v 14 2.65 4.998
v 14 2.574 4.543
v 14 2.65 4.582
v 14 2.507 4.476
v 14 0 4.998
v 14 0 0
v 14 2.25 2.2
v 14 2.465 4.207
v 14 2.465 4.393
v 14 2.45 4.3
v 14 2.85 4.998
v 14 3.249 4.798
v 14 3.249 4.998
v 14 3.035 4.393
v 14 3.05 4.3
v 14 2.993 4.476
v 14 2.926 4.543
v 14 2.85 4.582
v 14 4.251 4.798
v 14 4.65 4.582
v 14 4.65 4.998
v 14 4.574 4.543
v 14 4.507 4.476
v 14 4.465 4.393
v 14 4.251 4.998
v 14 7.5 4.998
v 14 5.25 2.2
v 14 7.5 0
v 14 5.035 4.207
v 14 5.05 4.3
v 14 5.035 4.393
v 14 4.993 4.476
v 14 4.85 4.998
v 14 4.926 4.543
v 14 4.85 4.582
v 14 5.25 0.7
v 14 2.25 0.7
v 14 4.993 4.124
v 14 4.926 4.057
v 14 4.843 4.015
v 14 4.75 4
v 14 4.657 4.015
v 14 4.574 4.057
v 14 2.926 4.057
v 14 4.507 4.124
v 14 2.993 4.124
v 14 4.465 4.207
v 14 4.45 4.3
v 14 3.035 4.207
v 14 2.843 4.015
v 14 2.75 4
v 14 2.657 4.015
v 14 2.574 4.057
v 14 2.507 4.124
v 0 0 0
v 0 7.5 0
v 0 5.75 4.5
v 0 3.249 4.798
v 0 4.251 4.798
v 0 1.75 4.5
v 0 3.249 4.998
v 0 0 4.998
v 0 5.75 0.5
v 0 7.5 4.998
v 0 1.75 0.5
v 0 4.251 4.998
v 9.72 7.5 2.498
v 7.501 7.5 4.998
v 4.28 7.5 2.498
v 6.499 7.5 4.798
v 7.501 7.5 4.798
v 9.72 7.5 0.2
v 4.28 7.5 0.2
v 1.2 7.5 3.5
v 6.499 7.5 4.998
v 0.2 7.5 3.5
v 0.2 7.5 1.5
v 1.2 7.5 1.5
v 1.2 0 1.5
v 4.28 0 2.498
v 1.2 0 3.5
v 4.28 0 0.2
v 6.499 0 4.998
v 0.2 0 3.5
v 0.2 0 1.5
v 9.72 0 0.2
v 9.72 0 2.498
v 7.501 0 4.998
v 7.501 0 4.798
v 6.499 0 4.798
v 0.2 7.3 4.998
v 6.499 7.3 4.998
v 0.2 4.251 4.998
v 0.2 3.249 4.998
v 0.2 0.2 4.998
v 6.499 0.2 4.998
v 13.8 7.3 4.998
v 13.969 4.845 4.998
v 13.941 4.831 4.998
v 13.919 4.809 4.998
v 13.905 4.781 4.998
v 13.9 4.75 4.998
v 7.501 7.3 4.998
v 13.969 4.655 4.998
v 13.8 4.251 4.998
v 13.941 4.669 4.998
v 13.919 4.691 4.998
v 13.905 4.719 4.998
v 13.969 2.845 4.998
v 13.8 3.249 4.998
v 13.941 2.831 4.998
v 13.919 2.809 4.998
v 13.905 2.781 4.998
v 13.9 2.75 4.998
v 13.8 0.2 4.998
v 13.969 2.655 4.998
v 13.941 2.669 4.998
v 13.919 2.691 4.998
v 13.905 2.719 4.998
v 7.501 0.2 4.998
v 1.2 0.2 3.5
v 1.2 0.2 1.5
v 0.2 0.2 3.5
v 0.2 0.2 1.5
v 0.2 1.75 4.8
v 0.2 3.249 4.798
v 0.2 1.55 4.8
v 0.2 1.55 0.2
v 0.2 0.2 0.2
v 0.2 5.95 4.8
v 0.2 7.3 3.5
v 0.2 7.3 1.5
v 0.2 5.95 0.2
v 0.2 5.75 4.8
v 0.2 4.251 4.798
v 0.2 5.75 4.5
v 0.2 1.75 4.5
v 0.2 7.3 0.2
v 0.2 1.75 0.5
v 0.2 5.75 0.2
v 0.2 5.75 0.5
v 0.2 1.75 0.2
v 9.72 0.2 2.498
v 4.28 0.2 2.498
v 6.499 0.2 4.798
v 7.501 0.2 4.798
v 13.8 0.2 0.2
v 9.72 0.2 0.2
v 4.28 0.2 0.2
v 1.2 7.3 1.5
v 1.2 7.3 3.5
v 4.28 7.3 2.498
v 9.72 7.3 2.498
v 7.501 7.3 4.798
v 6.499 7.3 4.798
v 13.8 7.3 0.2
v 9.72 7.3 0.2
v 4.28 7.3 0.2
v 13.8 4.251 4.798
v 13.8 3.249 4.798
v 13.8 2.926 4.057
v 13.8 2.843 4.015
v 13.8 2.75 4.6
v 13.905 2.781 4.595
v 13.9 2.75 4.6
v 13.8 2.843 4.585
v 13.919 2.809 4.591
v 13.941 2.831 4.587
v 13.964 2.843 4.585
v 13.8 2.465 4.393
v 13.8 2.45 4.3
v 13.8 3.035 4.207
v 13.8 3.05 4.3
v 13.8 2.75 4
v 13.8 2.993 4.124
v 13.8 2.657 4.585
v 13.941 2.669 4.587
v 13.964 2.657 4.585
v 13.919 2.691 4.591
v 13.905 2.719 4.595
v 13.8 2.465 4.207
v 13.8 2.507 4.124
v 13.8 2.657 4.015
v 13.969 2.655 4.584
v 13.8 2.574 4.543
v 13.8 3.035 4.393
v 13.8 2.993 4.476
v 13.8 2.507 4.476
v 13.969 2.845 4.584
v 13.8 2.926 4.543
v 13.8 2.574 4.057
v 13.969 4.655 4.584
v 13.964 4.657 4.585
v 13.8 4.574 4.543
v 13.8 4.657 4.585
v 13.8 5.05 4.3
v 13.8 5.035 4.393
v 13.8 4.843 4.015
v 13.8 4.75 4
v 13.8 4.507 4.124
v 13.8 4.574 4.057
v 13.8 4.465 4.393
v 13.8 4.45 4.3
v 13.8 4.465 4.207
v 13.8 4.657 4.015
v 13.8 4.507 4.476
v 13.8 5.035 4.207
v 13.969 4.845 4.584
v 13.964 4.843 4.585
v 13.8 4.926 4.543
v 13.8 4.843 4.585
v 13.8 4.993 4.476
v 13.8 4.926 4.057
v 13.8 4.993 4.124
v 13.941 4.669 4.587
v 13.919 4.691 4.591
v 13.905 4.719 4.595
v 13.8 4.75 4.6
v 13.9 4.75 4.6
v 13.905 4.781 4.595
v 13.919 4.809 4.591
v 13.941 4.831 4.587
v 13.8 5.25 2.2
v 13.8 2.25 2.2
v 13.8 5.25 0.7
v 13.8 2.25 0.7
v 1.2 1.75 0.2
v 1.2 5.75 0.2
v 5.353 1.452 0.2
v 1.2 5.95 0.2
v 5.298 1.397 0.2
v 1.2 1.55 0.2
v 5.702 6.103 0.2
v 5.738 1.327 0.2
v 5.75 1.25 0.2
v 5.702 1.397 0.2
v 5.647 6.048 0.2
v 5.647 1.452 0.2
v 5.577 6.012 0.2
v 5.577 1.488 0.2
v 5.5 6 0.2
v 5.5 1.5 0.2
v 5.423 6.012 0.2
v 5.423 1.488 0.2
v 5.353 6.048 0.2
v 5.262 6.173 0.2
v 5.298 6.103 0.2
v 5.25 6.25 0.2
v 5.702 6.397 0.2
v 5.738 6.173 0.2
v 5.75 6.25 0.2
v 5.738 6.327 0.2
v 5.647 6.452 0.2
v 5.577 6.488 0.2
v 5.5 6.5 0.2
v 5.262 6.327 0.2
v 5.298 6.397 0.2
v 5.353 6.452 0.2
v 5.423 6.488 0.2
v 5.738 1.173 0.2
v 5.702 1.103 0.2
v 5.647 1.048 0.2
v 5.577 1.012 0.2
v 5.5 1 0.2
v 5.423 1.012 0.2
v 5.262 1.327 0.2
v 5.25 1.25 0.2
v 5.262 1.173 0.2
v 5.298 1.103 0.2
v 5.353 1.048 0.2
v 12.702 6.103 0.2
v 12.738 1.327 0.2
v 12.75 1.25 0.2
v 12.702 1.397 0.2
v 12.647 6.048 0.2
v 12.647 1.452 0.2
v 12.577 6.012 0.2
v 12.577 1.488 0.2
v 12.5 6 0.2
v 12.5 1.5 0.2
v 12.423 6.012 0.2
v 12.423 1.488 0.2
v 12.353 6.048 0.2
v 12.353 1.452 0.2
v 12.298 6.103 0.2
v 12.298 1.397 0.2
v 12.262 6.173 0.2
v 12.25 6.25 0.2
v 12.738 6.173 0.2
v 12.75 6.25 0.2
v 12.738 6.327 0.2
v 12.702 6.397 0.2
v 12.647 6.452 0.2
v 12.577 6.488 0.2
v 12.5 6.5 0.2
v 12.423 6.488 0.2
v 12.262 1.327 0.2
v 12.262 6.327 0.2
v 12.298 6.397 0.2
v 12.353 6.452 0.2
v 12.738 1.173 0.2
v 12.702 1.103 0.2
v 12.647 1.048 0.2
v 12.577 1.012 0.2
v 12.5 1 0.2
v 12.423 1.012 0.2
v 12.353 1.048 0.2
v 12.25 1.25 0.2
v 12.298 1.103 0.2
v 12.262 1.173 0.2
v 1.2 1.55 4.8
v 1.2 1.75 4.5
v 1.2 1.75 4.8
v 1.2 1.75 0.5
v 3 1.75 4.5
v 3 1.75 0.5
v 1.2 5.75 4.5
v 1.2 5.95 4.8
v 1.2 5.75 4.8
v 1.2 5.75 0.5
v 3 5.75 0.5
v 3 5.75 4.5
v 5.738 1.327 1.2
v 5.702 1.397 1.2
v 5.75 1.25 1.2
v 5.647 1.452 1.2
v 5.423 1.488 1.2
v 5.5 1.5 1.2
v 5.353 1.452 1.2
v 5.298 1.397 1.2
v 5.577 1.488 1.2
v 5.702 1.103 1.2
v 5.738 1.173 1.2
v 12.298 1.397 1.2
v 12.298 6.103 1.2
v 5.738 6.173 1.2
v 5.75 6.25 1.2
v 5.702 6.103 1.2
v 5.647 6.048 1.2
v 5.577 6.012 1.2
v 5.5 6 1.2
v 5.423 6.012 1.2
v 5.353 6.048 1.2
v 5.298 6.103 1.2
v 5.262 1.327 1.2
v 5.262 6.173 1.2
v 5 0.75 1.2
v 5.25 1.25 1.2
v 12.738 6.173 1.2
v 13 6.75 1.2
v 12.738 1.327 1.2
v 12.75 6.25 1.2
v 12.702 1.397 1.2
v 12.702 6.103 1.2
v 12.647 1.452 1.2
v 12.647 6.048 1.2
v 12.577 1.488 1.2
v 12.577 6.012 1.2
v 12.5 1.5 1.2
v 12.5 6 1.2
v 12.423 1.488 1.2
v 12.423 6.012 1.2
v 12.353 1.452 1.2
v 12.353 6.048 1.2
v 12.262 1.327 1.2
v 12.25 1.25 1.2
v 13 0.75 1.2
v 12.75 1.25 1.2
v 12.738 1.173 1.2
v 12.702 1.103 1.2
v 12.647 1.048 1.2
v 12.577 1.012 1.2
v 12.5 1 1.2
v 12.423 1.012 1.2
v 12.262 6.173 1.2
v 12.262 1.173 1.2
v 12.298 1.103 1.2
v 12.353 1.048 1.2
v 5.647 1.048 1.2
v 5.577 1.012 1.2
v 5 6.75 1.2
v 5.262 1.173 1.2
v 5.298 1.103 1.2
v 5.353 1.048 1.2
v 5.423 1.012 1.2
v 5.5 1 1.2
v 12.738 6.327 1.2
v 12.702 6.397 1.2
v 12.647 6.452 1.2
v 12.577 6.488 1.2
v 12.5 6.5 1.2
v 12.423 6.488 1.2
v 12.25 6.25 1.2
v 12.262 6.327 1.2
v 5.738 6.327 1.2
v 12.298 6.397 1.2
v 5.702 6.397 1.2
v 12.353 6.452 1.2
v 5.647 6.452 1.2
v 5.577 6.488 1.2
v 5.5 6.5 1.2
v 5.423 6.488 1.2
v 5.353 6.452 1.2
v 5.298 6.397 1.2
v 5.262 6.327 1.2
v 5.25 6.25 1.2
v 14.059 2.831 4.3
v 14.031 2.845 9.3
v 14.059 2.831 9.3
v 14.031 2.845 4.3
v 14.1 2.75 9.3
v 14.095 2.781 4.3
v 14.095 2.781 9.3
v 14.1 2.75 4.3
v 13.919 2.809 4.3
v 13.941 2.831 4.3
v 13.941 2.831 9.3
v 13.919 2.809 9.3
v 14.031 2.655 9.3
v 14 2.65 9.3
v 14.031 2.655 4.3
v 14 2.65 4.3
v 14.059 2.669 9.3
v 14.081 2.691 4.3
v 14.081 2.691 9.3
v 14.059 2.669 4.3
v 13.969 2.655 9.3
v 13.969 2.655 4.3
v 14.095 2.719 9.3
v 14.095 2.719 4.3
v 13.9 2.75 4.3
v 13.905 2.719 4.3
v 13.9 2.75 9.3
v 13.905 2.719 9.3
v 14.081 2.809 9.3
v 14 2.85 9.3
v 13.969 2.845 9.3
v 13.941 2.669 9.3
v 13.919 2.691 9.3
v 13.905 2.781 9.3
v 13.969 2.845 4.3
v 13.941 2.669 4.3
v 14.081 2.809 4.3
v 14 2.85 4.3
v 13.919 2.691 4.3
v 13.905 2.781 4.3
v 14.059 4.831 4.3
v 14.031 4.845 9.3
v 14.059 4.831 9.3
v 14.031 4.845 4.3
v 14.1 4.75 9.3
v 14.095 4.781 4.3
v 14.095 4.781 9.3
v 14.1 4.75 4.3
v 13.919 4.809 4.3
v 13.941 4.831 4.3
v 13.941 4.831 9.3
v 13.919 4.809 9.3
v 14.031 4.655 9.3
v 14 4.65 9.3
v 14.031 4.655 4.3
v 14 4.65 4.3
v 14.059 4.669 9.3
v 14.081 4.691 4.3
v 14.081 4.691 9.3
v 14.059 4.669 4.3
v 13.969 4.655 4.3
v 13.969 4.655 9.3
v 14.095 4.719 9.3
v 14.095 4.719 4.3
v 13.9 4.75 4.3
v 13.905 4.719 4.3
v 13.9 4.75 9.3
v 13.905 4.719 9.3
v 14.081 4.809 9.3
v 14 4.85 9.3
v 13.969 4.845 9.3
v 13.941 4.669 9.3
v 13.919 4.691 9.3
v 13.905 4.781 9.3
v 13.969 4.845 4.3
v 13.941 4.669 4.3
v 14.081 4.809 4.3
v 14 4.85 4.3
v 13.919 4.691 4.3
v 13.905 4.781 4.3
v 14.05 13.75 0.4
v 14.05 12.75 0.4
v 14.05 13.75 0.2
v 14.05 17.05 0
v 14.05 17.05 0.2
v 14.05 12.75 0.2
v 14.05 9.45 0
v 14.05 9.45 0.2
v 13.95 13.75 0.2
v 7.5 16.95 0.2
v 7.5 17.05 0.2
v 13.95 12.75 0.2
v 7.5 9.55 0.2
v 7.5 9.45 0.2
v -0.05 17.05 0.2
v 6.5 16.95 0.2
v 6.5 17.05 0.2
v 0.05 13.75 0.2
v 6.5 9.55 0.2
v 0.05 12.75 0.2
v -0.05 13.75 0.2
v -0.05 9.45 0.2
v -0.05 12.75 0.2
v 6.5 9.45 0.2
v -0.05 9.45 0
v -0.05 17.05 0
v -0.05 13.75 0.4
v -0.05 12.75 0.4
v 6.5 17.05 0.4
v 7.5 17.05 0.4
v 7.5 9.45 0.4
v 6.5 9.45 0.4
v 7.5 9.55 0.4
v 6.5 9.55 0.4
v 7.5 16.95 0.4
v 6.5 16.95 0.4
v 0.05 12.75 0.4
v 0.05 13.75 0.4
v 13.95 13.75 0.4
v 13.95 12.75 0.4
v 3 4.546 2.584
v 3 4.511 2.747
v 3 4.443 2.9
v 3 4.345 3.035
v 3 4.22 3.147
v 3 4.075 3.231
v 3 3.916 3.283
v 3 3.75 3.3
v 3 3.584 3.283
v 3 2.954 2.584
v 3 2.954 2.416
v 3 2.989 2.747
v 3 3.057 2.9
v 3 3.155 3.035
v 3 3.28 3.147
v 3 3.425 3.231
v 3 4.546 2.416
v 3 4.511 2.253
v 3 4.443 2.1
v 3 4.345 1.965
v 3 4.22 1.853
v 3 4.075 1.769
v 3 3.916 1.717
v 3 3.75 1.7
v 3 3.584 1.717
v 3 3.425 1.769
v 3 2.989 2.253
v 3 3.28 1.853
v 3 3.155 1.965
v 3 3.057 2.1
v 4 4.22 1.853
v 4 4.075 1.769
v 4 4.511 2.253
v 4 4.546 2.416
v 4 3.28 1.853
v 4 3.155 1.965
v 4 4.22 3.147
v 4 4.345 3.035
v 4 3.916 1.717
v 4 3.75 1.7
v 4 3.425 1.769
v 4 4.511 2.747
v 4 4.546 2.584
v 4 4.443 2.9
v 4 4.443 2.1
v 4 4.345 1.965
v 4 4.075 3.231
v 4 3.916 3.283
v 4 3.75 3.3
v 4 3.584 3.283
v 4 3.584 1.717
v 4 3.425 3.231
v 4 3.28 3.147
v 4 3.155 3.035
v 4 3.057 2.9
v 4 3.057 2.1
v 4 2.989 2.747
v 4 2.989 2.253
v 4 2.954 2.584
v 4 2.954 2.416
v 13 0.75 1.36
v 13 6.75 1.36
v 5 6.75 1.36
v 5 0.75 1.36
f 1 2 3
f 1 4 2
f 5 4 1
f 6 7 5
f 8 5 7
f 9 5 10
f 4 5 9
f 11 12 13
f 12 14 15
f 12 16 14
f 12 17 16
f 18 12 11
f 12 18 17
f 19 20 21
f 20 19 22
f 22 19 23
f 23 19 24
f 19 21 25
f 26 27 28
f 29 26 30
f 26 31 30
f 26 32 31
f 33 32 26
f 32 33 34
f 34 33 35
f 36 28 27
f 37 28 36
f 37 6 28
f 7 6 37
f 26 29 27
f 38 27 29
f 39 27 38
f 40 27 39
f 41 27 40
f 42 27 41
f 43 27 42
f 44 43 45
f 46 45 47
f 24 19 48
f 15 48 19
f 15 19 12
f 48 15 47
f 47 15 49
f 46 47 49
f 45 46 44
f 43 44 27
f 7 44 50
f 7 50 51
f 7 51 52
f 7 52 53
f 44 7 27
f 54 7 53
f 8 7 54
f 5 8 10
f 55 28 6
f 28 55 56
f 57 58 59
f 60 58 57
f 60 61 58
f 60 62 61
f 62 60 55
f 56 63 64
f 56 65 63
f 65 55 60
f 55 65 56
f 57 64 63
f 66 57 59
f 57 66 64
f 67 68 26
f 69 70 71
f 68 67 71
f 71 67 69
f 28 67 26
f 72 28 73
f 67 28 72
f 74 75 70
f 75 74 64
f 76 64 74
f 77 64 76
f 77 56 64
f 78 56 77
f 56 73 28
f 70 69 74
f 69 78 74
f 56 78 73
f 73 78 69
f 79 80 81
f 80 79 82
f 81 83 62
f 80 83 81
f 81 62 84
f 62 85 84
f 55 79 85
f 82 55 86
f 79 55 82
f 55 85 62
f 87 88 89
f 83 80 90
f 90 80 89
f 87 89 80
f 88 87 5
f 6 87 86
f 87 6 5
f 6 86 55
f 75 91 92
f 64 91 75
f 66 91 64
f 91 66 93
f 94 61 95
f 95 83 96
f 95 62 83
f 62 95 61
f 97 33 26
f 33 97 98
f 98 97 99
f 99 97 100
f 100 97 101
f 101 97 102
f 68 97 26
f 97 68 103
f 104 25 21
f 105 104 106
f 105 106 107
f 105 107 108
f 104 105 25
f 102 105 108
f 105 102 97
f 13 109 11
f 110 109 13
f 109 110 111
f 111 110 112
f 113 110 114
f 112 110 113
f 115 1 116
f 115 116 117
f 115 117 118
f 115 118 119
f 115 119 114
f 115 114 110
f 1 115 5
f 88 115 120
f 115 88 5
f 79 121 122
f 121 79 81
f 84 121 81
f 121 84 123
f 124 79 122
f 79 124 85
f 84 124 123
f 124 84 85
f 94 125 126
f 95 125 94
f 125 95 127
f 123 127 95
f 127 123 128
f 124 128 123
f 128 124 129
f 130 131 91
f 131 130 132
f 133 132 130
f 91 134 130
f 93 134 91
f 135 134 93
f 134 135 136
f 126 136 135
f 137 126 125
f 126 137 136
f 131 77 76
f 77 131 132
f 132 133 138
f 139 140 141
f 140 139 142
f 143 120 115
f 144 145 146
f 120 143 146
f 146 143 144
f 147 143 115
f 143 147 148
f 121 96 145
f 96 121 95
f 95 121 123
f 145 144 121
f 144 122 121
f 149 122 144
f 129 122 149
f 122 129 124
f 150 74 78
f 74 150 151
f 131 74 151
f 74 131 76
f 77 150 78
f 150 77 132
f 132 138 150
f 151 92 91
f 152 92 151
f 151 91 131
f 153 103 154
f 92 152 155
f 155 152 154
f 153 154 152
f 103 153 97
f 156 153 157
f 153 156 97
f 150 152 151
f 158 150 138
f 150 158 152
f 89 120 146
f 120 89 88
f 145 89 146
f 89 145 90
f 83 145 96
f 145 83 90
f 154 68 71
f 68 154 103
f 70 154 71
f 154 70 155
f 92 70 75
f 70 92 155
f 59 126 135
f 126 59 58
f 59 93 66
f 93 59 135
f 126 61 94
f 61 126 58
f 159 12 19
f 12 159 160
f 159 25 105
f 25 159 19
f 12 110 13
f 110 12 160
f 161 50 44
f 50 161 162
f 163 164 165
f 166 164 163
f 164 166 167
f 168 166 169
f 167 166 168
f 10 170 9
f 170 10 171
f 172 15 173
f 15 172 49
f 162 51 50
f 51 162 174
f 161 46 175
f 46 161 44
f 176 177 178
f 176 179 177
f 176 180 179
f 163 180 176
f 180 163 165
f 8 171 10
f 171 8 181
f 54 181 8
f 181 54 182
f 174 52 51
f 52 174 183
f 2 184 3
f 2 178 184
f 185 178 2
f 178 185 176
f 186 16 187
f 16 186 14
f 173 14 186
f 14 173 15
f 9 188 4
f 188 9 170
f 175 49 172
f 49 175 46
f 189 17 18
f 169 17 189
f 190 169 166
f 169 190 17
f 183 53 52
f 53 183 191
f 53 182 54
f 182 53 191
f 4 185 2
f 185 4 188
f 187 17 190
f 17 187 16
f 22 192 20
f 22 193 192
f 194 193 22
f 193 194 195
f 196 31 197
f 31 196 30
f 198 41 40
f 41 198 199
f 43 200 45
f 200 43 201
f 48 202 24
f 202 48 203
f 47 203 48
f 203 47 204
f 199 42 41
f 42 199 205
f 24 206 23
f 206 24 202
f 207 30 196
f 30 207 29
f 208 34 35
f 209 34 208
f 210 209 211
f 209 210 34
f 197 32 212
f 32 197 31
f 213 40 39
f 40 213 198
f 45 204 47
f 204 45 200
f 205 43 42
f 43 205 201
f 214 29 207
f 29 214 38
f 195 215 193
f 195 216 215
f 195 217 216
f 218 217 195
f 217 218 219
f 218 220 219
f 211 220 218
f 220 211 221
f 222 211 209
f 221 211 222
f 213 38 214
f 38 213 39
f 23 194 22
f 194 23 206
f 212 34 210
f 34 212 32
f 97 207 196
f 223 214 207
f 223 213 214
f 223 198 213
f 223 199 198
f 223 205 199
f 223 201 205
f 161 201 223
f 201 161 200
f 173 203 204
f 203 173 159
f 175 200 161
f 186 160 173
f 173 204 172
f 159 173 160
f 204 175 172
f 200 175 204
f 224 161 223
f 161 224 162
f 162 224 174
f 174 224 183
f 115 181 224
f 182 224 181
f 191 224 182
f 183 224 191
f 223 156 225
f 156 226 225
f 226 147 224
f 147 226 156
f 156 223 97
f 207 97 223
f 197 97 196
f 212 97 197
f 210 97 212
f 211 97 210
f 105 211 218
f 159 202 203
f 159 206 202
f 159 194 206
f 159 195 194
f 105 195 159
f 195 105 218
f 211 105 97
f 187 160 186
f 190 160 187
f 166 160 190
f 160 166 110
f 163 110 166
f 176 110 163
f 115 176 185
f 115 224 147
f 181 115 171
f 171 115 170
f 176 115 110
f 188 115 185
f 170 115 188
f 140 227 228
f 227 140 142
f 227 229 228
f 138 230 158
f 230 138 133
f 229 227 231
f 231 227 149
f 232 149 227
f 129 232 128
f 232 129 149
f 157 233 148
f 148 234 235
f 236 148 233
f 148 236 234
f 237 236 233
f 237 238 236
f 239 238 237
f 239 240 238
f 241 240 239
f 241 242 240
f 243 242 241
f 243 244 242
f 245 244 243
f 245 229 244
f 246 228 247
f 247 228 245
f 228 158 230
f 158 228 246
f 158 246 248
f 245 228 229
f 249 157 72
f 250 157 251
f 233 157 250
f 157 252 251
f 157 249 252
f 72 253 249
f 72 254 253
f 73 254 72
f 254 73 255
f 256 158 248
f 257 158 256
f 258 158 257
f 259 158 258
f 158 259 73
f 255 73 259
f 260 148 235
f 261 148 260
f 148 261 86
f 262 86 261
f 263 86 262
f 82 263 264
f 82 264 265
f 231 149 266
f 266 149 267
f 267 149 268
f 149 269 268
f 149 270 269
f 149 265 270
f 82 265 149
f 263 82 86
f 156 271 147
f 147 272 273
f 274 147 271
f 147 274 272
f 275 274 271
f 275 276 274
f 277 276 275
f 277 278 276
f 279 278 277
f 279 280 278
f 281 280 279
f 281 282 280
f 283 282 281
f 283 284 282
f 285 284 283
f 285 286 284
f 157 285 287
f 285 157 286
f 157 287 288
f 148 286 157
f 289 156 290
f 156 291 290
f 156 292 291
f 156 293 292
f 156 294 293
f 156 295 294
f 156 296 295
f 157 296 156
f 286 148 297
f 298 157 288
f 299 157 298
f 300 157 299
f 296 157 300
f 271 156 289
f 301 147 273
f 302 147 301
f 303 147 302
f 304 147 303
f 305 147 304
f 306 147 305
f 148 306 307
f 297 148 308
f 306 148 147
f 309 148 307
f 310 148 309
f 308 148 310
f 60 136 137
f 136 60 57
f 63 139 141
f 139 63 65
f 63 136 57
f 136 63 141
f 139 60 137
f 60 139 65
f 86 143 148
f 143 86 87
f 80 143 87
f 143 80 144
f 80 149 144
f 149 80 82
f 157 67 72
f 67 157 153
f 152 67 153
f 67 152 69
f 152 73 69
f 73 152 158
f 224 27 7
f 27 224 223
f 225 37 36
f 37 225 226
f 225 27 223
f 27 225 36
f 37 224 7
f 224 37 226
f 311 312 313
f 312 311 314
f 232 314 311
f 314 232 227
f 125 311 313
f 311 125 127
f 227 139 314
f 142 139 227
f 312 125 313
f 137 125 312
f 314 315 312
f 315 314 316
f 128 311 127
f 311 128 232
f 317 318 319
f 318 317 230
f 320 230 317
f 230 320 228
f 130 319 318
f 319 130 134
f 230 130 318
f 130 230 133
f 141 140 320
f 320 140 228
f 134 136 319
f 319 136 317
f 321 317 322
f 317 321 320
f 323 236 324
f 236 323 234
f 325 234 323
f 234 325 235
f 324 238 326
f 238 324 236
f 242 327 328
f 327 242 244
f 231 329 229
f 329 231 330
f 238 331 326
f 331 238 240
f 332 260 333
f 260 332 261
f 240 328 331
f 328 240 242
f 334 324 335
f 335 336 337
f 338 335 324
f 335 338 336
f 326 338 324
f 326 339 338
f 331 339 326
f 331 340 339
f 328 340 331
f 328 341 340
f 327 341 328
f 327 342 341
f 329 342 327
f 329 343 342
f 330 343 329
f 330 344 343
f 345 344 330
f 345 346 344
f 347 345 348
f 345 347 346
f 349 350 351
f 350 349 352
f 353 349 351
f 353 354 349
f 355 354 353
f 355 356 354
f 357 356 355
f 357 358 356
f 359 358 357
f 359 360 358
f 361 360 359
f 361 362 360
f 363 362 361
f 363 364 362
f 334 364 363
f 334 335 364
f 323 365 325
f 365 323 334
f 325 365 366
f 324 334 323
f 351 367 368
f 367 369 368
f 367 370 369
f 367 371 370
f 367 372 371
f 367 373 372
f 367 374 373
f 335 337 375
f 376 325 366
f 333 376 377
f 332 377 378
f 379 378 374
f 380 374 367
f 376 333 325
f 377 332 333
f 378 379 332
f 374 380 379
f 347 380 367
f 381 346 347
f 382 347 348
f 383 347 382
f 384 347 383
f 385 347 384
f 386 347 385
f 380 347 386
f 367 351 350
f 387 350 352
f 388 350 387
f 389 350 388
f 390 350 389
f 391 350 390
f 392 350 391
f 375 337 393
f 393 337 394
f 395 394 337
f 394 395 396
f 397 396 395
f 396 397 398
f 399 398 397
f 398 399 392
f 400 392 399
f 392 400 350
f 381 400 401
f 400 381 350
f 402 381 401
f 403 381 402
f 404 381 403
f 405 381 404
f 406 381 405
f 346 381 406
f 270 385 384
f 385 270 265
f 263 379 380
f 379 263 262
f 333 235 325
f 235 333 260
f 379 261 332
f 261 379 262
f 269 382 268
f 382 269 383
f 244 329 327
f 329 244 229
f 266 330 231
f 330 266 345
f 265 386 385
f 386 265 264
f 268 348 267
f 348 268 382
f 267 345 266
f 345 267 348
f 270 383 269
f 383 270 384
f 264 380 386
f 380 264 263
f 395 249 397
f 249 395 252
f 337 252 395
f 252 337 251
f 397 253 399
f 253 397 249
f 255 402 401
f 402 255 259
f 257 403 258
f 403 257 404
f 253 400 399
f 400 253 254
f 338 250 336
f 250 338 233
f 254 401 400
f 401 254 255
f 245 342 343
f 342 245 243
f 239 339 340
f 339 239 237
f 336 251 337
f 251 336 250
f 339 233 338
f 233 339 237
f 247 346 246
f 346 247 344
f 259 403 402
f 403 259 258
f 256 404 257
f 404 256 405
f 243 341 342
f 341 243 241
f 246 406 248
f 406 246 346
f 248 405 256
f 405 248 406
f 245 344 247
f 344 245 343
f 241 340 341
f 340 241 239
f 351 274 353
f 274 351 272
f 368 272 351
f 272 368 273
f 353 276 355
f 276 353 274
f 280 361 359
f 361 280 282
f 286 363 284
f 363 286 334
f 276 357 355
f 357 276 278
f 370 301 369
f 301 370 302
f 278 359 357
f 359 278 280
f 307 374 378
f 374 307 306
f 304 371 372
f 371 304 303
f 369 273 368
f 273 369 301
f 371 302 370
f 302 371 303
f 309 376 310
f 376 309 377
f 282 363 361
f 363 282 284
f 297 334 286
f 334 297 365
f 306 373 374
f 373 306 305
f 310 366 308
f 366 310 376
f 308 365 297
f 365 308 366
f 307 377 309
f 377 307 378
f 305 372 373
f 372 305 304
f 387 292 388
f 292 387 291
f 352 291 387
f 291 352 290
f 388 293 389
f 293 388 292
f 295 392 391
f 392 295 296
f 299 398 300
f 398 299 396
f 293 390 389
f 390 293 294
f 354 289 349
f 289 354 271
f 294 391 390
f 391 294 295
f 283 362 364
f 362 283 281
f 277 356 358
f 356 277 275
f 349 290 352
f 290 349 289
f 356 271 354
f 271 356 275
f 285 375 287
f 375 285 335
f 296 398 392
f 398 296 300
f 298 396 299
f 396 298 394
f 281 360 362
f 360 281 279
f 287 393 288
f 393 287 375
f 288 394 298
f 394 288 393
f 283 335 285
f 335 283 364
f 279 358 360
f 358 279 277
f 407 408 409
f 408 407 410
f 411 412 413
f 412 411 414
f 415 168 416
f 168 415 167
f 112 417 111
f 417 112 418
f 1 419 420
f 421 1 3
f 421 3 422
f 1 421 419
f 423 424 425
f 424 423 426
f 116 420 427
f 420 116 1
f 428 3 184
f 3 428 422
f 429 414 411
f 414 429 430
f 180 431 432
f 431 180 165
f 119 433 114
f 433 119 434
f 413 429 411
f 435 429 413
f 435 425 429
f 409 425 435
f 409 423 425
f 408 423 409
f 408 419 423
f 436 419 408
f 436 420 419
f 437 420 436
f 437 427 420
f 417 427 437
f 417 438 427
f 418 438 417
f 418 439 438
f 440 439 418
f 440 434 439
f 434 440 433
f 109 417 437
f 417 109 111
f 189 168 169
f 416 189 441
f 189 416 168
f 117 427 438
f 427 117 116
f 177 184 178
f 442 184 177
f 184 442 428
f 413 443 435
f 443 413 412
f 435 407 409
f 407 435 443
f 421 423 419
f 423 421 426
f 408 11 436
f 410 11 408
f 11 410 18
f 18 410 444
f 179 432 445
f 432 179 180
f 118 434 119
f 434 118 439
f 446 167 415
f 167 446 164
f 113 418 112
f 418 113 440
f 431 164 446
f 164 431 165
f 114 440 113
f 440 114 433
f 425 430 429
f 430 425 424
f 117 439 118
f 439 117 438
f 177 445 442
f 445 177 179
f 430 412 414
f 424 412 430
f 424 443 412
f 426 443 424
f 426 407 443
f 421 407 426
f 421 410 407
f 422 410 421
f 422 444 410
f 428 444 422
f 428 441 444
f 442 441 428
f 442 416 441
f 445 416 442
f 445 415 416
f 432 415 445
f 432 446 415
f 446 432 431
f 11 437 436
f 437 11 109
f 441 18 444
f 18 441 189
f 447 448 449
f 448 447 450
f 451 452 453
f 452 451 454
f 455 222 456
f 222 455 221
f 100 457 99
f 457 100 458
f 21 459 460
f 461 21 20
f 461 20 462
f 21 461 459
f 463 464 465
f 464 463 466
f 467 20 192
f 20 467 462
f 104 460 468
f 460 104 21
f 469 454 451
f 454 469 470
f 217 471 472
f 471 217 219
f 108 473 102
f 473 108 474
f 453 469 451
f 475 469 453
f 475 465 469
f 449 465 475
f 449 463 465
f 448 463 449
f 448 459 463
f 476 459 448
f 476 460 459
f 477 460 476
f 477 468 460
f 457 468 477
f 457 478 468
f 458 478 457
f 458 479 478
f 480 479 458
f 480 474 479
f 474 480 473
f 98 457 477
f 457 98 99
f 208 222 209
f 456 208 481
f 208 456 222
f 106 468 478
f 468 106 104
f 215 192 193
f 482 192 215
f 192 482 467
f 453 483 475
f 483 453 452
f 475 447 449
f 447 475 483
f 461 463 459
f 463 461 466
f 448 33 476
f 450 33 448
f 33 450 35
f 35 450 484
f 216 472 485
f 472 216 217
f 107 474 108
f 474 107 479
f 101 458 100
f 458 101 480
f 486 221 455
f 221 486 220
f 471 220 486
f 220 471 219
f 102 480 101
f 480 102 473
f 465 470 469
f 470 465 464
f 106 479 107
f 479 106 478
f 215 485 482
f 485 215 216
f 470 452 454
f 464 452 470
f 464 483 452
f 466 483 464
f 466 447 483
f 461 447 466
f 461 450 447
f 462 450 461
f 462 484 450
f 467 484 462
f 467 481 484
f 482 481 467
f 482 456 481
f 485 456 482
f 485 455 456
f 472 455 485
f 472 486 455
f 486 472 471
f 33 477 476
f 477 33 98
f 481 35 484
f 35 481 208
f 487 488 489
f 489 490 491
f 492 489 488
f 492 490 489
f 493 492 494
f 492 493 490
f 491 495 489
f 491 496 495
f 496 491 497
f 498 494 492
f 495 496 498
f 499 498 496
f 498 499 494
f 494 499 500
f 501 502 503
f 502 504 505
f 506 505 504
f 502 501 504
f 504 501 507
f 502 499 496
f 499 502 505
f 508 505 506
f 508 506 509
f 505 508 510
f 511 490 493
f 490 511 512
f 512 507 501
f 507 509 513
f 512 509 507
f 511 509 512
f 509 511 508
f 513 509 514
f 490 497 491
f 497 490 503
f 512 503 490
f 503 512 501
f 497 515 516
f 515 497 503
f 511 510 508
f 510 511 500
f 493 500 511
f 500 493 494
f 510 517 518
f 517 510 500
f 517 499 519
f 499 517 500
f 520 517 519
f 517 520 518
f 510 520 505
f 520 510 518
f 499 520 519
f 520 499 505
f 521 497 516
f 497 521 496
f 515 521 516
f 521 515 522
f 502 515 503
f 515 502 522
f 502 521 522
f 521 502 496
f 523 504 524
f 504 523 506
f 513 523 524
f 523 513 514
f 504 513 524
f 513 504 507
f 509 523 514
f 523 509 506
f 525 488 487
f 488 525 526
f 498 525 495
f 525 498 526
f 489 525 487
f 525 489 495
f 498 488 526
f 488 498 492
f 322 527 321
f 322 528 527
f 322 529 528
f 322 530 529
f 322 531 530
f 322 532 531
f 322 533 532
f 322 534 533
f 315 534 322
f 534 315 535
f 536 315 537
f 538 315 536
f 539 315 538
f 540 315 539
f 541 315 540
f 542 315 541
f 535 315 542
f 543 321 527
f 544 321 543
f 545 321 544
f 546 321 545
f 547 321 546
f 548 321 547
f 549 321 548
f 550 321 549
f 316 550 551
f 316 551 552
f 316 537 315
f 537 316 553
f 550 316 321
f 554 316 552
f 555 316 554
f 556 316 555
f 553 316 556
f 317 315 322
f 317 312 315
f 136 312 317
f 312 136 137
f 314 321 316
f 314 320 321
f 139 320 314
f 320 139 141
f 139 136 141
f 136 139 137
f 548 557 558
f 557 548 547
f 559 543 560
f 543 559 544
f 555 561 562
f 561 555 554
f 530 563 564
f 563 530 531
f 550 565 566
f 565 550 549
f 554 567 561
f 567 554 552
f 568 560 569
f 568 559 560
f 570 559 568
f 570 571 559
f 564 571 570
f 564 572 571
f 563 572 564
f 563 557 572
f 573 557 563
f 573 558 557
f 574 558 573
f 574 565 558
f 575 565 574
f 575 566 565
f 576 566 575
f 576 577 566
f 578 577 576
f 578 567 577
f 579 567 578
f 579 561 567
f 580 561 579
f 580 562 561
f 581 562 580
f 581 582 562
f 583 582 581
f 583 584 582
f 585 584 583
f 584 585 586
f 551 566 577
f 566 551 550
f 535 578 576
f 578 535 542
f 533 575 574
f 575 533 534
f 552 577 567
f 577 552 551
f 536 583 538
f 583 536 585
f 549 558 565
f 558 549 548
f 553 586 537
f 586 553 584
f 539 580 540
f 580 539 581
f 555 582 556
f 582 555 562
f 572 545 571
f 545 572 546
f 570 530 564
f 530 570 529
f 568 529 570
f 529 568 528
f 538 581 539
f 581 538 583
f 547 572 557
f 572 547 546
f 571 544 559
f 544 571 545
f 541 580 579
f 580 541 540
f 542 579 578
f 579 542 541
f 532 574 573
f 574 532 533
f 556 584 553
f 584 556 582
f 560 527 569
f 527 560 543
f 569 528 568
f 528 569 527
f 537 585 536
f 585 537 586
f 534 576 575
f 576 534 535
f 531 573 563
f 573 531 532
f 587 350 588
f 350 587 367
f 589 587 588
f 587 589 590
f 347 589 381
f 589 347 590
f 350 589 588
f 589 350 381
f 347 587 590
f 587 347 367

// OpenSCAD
// Parameters for the box dimensions
box_length = 14;  // Length of the box (cm)
box_width = 7.5;    // Width of the box (cm)
box_height = 5; // Height of the box (cm)
wall_thickness = 0.2; // Thickness of the walls (cm)

// Parameters for the camera module (unused for holes, kept for reference)
camera_size = 4;    // Width and height of the camera module (cm)
camera_depth = 2.8;   // Depth of the lens protrusion (cm)
camera_offset_z = box_height / 2; // Center the camera vertically on the front face

// Tolerance for fitting parts
tolerance = 0.002; // Small tolerance for snug fit (cm)

// Parameters for the camera mounts (ledges)
ledge_thickness = 0.2; // Thickness of the supporting ledges (cm)
ledge_depth = 1.0;     // Depth of the ledges (cm)

// Parameters for the access holes on the side walls (for mounts)
hole_width = 1.0;      // Width of the hole along the X-axis (cm)
hole_height = 2.0;     // Height of the hole along the Z-axis (cm)
hole_depth = wall_thickness + tolerance; // Depth to cut through the wall (Y-axis)

// Parameters for the large holes on the side walls
large_hole_length = (box_length - 2 * wall_thickness) * 0.4; // 40% of internal length (approx. 5.44 cm)
large_hole_height = (box_height - 2 * wall_thickness - 2 * tolerance) / 2; // Half of the original height (approx. 2.29 cm)

// Parameters for the snap-on lid
lid_thickness = 0.2; // Thickness of the lid (cm)
snap_clearance = 0.05; // Clearance for the lid to fit over the walls (cm)
snap_hook_width = 1.0; // Width of the snap hooks (cm)
snap_hook_depth = 0.1; // Depth of the snap hooks (protrusion inward, cm)
snap_hook_height = 0.2; // Height of the snap hooks (cm)
snap_recess_depth = snap_hook_depth + tolerance; // Depth of the recess in the walls (cm)
snap_recess_height = snap_hook_height + tolerance; // Height of the recess (cm)
snap_recess_width = snap_hook_width + tolerance; // Width of the recess (cm)

// Parameters for the I/O port hole on the back wall
io_port_width = 3.0; // Width of the I/O port hole (cm) - increased from 2.0 to 3.0
io_port_height = 1.5; // Height of the I/O port hole (cm) - increased from 1.0 to 1.5
io_port_offset_z = wall_thickness + 0.5; // Distance from the bottom of the enclosure (cm)

// Parameters for the PCB
pcb_length = 8.0;     // Length of the PCB (cm)
pcb_width = 6.0;      // Width of the PCB (cm)
pcb_thickness = 0.16; // Thickness of the PCB (cm)
pcb_offset_x = 5.0;   // Distance from the front wall (where camera is) to PCB front edge (cm)
pcb_offset_y = (box_width - pcb_width) / 2; // Center the PCB along the width
pcb_height = 1.0;     // Height from the bottom of the enclosure to bottom of PCB (cm)

// Parameters for PCB mounting posts
post_diameter = 0.5;  // Diameter of the mounting posts (cm)
post_height = pcb_height;  // Height of the mounting posts (cm)
mounting_hole_diameter = 0.3; // Diameter of the mounting holes in PCB (cm)
mounting_hole_inset = 0.5; // Distance from edge of PCB to center of mounting hole (cm)

// Parameters for the antennas
antenna_hole_diameter = 0.6; // Diameter of the hole for the antenna connector (cm)
antenna_spacing = 2.0; // Spacing between the two antennas (cm)
antenna_height = box_height - wall_thickness - 0.5; // Position antennas near the top of the back wall (cm)
antenna_length = 5.0; // Length of the antenna for visualization (cm)
antenna_diameter = 0.2; // Diameter of the antenna rod for visualization (cm)

// Main module to assemble the entire design
module webcam_enclosure() {
    // Color the box silver
    color("silver") {
        difference() {
            // Create the outer shell of the box (without top)
            outer_box();
            
            // Hollow out the interior (without top)
            translate([wall_thickness, wall_thickness, wall_thickness])
                inner_box();
            
            // Cutout for the camera on the front face
            camera_cutout();
            
            // Large cutout for the left side wall
            large_left_hole();
            
            // Large cutout for the right side wall
            large_right_hole();
            
            // Add smaller holes on both side walls to see/access the mounts
            side_holes();
            
            // Add recesses for the snap hooks
            snap_recesses();
            
            // Add I/O port hole on the back wall
            io_port_hole();
            
            // Add antenna holes on the back wall
            antenna_holes();
        }
    }
    
    // Add internal mounting structure for the camera (yellow)
    color("yellow")
        camera_mount();
    
    // Add PCB mounting posts (yellow)
    color("yellow")
        pcb_mounting_posts();
}

// Module for the outer shell of the box (without top)
module outer_box() {
    difference() {
        // Full cube
        cube([box_length, box_width, box_height]);
        // Remove the top face by cutting out a block above the top edge
        translate([-tolerance, -tolerance, box_height - tolerance])
            cube([box_length + 2 * tolerance, box_width + 2 * tolerance, tolerance + 1]);
    }
}

// Module for the inner hollow part of the box (without top)
module inner_box() {
    cube([box_length - 2 * wall_thickness, 
          box_width - 2 * wall_thickness, 
          box_height]); // Extend past box_height to ensure the top is open
}

// Module for the camera cutout on the front face
module camera_cutout() {
    translate([-tolerance, 
               (box_width - camera_size) / 2, 
               camera_offset_z - camera_size / 2])
        cube([wall_thickness + 2 * tolerance, 
              camera_size, 
              camera_size]);
}

// Module for the internal camera mounting structure (colored yellow)
module camera_mount() {
    // Internal height of the box (from floor to top of side walls)
    internal_height = box_height - wall_thickness; // Since top is open, only bottom wall thickness matters
    
    // Left ledge
    translate([wall_thickness, 
               (box_width - camera_size) / 2 - ledge_thickness, 
               wall_thickness]) // Start at the floor
        cube([ledge_depth, 
              ledge_thickness, 
              internal_height - wall_thickness]); // Stop at the top of the side walls
    
    // Right ledge
    translate([wall_thickness, 
               (box_width + camera_size) / 2, 
               wall_thickness]) // Start at the floor
        cube([ledge_depth, 
              ledge_thickness, 
              internal_height - wall_thickness]); // Stop at the top of the side walls
}

// Module for the large hole on the left side wall (Y=0 face)
module large_left_hole() {
    translate([wall_thickness + (box_length - large_hole_length - 2 * wall_thickness) / 2, 
               -tolerance, 
               wall_thickness]) // Aligned to the bottom (Z=wall_thickness)
        cube([large_hole_length, 
              wall_thickness + 2 * tolerance, 
              large_hole_height]);
}

// Module for the large hole on the right side wall (Y=box_width face)
module large_right_hole() {
    translate([wall_thickness + (box_length - large_hole_length - 2 * wall_thickness) / 2, 
               box_width - wall_thickness, // Adjusted to start at the outer edge
               wall_thickness]) // Aligned to the bottom (Z=wall_thickness)
        cube([large_hole_length, 
              wall_thickness + 2 * tolerance, // Ensure it cuts through the wall
              large_hole_height]);
}

// Module for the smaller access holes on both side walls (for mounts)
module side_holes() {
    // Left side hole (Y=0 face)
    translate([wall_thickness, 
               -tolerance, 
               camera_offset_z - hole_height / 2])
        cube([hole_width, 
              hole_depth, 
              hole_height]);
    
    // Right side hole (Y=box_width face)
    translate([wall_thickness, 
               box_width - hole_depth + tolerance, 
               camera_offset_z - hole_height / 2])
        cube([hole_width, 
              hole_depth, 
              hole_height]);
}

// Module to add recesses for the snap hooks on the outer walls
module snap_recesses() {
    // Front wall (X=0 face)
    translate([(box_length - snap_recess_width) / 2, -tolerance, box_height - snap_recess_height])
        cube([snap_recess_width, wall_thickness + 2 * tolerance, snap_recess_height + tolerance]);
    
    // Back wall (X=box_length face)
    translate([(box_length - snap_recess_width) / 2, box_width - wall_thickness - tolerance, box_height - snap_recess_height])
        cube([snap_recess_width, wall_thickness + 2 * tolerance, snap_recess_height + tolerance]);
    
    // Left wall (Y=0 face)
    translate([-tolerance, (box_width - snap_recess_width) / 2, box_height - snap_recess_height])
        cube([wall_thickness + 2 * tolerance, snap_recess_width, snap_recess_height + tolerance]);
    
    // Right wall (Y=box_width face)
    translate([box_length - wall_thickness - tolerance, (box_width - snap_recess_width) / 2, box_height - snap_recess_height])
        cube([wall_thickness + 2 * tolerance, snap_recess_width, snap_recess_height + tolerance]);
}

// Module for the I/O port hole on the back wall (X=box_length face)
module io_port_hole() {
    translate([box_length - wall_thickness - tolerance, 
               (box_width - io_port_width) / 2, 
               io_port_offset_z])
        cube([wall_thickness + 2 * tolerance, 
              io_port_width, 
              io_port_height]);
}

// Module for the antenna holes on the back wall (X=box_length face)
module antenna_holes() {
    antenna_y_offset = (box_width - antenna_spacing) / 2; // Center the two antennas
    
    // Left antenna hole
    translate([box_length - wall_thickness - tolerance, 
               antenna_y_offset, 
               antenna_height])
        rotate([0, 90, 0]) // Rotate to cut through the wall
        cylinder(h=wall_thickness + 2 * tolerance, d=antenna_hole_diameter, $fn=20);
    
    // Right antenna hole
    translate([box_length - wall_thickness - tolerance, 
               antenna_y_offset + antenna_spacing, 
               antenna_height])
        rotate([0, 90, 0]) // Rotate to cut through the wall
        cylinder(h=wall_thickness + 2 * tolerance, d=antenna_hole_diameter, $fn=20);
}

// Module to visualize the antennas (for reference only)
module antenna_visualization() {
    antenna_y_offset = (box_width - antenna_spacing) / 2; // Same offset as the holes
    
    // Left antenna
    translate([box_length, 
               antenna_y_offset, 
               antenna_height])
        color("black")
        cylinder(h=antenna_length, d=antenna_diameter, $fn=20);
    
    // Right antenna
    translate([box_length, 
               antenna_y_offset + antenna_spacing, 
               antenna_height])
        color("black")
        cylinder(h=antenna_length, d=antenna_diameter, $fn=20);
}

// Module for PCB mounting posts (colored yellow)
module pcb_mounting_posts() {
    // Front-left post
    translate([pcb_offset_x + mounting_hole_inset, 
               pcb_offset_y + mounting_hole_inset, 
               wall_thickness])
        cylinder(h=post_height, d=post_diameter, $fn=20);
    
    // Front-right post
    translate([pcb_offset_x + mounting_hole_inset, 
               pcb_offset_y + pcb_width - mounting_hole_inset, 
               wall_thickness])
        cylinder(h=post_height, d=post_diameter, $fn=20);
    
    // Back-left post
    translate([pcb_offset_x + pcb_length - mounting_hole_inset, 
               pcb_offset_y + mounting_hole_inset, 
               wall_thickness])
        cylinder(h=post_height, d=post_diameter, $fn=20);
    
    // Back-right post
    translate([pcb_offset_x + pcb_length - mounting_hole_inset, 
               pcb_offset_y + pcb_width - mounting_hole_inset, 
               wall_thickness])
        cylinder(h=post_height, d=post_diameter, $fn=20);
}

// Module to visualize the PCB (already green)
module pcb_visualization() {
    translate([pcb_offset_x, pcb_offset_y, wall_thickness + post_height])
        color("green")
        cube([pcb_length, pcb_width, pcb_thickness]);
}

// NEW: Module to visualize the camera with a lens
module camera_visualization() {
    // Position the camera at the same location as before
    translate([wall_thickness, (box_width - camera_size) / 2, camera_offset_z - camera_size / 2]) {
        // Camera body (blue cube)
        color("blue")
            cube([camera_depth, camera_size, camera_size]);
        
        // Lens (black cylinder) on the front face
        lens_diameter = camera_size * 0.4; // Lens diameter is 40% of camera width for proportion
        lens_length = 1; // Lens protrudes 0.5 cm from the front
        translate([camera_depth, camera_size / 2, camera_size / 2]) // Center the lens on the front face
            rotate([0, 90, 0]) // Rotate to protrude outward along X-axis
            color("black")
            cylinder(h=lens_length, d=lens_diameter, $fn=30);
    }
}

// Module for the snap-on lid (keeping it silver to match the box)
module lid() {
    color("silver") {
        // Main lid body
        difference() {
            // Basic lid plate
            translate([-snap_clearance, -snap_clearance, 0])
                cube([box_length + 2 * snap_clearance, box_width + 2 * snap_clearance, lid_thickness]);
            
            // Optional: Add a small chamfer or fillet on the edges for aesthetics (not implemented here)
        }
        
        // Add snap hooks on the underside of the lid
        // Front snap hook
        translate([(box_length - snap_hook_width) / 2, -snap_clearance, lid_thickness])
            cube([snap_hook_width, snap_hook_depth, snap_hook_height]);
        
        // Back snap hook
        translate([(box_length - snap_hook_width) / 2, box_width + snap_clearance - snap_hook_depth, lid_thickness])
            cube([snap_hook_width, snap_hook_depth, snap_hook_height]);
        
        // Left snap hook
        translate([-snap_clearance, (box_width - snap_hook_width) / 2, lid_thickness])
            cube([snap_hook_depth, snap_hook_width, snap_hook_height]);
        
        // Right snap hook
        translate([box_length + snap_clearance - snap_hook_depth, (box_width - snap_hook_width) / 2, lid_thickness])
            cube([snap_hook_depth, snap_hook_width, snap_hook_height]);
    }
}

// Render the entire design
webcam_enclosure();

// Render the PCB for visualization (already green)
pcb_visualization();

// Render the antennas for visualization
antenna_visualization();

// Render the lid (positioned along the Y-axis, to the side of the enclosure for visualization)
translate([0, box_width + 2, 0]) // Move the lid along the Y-axis with a 2cm gap
    lid();

// NEW: Visualize the camera with a lens
camera_visualization();
